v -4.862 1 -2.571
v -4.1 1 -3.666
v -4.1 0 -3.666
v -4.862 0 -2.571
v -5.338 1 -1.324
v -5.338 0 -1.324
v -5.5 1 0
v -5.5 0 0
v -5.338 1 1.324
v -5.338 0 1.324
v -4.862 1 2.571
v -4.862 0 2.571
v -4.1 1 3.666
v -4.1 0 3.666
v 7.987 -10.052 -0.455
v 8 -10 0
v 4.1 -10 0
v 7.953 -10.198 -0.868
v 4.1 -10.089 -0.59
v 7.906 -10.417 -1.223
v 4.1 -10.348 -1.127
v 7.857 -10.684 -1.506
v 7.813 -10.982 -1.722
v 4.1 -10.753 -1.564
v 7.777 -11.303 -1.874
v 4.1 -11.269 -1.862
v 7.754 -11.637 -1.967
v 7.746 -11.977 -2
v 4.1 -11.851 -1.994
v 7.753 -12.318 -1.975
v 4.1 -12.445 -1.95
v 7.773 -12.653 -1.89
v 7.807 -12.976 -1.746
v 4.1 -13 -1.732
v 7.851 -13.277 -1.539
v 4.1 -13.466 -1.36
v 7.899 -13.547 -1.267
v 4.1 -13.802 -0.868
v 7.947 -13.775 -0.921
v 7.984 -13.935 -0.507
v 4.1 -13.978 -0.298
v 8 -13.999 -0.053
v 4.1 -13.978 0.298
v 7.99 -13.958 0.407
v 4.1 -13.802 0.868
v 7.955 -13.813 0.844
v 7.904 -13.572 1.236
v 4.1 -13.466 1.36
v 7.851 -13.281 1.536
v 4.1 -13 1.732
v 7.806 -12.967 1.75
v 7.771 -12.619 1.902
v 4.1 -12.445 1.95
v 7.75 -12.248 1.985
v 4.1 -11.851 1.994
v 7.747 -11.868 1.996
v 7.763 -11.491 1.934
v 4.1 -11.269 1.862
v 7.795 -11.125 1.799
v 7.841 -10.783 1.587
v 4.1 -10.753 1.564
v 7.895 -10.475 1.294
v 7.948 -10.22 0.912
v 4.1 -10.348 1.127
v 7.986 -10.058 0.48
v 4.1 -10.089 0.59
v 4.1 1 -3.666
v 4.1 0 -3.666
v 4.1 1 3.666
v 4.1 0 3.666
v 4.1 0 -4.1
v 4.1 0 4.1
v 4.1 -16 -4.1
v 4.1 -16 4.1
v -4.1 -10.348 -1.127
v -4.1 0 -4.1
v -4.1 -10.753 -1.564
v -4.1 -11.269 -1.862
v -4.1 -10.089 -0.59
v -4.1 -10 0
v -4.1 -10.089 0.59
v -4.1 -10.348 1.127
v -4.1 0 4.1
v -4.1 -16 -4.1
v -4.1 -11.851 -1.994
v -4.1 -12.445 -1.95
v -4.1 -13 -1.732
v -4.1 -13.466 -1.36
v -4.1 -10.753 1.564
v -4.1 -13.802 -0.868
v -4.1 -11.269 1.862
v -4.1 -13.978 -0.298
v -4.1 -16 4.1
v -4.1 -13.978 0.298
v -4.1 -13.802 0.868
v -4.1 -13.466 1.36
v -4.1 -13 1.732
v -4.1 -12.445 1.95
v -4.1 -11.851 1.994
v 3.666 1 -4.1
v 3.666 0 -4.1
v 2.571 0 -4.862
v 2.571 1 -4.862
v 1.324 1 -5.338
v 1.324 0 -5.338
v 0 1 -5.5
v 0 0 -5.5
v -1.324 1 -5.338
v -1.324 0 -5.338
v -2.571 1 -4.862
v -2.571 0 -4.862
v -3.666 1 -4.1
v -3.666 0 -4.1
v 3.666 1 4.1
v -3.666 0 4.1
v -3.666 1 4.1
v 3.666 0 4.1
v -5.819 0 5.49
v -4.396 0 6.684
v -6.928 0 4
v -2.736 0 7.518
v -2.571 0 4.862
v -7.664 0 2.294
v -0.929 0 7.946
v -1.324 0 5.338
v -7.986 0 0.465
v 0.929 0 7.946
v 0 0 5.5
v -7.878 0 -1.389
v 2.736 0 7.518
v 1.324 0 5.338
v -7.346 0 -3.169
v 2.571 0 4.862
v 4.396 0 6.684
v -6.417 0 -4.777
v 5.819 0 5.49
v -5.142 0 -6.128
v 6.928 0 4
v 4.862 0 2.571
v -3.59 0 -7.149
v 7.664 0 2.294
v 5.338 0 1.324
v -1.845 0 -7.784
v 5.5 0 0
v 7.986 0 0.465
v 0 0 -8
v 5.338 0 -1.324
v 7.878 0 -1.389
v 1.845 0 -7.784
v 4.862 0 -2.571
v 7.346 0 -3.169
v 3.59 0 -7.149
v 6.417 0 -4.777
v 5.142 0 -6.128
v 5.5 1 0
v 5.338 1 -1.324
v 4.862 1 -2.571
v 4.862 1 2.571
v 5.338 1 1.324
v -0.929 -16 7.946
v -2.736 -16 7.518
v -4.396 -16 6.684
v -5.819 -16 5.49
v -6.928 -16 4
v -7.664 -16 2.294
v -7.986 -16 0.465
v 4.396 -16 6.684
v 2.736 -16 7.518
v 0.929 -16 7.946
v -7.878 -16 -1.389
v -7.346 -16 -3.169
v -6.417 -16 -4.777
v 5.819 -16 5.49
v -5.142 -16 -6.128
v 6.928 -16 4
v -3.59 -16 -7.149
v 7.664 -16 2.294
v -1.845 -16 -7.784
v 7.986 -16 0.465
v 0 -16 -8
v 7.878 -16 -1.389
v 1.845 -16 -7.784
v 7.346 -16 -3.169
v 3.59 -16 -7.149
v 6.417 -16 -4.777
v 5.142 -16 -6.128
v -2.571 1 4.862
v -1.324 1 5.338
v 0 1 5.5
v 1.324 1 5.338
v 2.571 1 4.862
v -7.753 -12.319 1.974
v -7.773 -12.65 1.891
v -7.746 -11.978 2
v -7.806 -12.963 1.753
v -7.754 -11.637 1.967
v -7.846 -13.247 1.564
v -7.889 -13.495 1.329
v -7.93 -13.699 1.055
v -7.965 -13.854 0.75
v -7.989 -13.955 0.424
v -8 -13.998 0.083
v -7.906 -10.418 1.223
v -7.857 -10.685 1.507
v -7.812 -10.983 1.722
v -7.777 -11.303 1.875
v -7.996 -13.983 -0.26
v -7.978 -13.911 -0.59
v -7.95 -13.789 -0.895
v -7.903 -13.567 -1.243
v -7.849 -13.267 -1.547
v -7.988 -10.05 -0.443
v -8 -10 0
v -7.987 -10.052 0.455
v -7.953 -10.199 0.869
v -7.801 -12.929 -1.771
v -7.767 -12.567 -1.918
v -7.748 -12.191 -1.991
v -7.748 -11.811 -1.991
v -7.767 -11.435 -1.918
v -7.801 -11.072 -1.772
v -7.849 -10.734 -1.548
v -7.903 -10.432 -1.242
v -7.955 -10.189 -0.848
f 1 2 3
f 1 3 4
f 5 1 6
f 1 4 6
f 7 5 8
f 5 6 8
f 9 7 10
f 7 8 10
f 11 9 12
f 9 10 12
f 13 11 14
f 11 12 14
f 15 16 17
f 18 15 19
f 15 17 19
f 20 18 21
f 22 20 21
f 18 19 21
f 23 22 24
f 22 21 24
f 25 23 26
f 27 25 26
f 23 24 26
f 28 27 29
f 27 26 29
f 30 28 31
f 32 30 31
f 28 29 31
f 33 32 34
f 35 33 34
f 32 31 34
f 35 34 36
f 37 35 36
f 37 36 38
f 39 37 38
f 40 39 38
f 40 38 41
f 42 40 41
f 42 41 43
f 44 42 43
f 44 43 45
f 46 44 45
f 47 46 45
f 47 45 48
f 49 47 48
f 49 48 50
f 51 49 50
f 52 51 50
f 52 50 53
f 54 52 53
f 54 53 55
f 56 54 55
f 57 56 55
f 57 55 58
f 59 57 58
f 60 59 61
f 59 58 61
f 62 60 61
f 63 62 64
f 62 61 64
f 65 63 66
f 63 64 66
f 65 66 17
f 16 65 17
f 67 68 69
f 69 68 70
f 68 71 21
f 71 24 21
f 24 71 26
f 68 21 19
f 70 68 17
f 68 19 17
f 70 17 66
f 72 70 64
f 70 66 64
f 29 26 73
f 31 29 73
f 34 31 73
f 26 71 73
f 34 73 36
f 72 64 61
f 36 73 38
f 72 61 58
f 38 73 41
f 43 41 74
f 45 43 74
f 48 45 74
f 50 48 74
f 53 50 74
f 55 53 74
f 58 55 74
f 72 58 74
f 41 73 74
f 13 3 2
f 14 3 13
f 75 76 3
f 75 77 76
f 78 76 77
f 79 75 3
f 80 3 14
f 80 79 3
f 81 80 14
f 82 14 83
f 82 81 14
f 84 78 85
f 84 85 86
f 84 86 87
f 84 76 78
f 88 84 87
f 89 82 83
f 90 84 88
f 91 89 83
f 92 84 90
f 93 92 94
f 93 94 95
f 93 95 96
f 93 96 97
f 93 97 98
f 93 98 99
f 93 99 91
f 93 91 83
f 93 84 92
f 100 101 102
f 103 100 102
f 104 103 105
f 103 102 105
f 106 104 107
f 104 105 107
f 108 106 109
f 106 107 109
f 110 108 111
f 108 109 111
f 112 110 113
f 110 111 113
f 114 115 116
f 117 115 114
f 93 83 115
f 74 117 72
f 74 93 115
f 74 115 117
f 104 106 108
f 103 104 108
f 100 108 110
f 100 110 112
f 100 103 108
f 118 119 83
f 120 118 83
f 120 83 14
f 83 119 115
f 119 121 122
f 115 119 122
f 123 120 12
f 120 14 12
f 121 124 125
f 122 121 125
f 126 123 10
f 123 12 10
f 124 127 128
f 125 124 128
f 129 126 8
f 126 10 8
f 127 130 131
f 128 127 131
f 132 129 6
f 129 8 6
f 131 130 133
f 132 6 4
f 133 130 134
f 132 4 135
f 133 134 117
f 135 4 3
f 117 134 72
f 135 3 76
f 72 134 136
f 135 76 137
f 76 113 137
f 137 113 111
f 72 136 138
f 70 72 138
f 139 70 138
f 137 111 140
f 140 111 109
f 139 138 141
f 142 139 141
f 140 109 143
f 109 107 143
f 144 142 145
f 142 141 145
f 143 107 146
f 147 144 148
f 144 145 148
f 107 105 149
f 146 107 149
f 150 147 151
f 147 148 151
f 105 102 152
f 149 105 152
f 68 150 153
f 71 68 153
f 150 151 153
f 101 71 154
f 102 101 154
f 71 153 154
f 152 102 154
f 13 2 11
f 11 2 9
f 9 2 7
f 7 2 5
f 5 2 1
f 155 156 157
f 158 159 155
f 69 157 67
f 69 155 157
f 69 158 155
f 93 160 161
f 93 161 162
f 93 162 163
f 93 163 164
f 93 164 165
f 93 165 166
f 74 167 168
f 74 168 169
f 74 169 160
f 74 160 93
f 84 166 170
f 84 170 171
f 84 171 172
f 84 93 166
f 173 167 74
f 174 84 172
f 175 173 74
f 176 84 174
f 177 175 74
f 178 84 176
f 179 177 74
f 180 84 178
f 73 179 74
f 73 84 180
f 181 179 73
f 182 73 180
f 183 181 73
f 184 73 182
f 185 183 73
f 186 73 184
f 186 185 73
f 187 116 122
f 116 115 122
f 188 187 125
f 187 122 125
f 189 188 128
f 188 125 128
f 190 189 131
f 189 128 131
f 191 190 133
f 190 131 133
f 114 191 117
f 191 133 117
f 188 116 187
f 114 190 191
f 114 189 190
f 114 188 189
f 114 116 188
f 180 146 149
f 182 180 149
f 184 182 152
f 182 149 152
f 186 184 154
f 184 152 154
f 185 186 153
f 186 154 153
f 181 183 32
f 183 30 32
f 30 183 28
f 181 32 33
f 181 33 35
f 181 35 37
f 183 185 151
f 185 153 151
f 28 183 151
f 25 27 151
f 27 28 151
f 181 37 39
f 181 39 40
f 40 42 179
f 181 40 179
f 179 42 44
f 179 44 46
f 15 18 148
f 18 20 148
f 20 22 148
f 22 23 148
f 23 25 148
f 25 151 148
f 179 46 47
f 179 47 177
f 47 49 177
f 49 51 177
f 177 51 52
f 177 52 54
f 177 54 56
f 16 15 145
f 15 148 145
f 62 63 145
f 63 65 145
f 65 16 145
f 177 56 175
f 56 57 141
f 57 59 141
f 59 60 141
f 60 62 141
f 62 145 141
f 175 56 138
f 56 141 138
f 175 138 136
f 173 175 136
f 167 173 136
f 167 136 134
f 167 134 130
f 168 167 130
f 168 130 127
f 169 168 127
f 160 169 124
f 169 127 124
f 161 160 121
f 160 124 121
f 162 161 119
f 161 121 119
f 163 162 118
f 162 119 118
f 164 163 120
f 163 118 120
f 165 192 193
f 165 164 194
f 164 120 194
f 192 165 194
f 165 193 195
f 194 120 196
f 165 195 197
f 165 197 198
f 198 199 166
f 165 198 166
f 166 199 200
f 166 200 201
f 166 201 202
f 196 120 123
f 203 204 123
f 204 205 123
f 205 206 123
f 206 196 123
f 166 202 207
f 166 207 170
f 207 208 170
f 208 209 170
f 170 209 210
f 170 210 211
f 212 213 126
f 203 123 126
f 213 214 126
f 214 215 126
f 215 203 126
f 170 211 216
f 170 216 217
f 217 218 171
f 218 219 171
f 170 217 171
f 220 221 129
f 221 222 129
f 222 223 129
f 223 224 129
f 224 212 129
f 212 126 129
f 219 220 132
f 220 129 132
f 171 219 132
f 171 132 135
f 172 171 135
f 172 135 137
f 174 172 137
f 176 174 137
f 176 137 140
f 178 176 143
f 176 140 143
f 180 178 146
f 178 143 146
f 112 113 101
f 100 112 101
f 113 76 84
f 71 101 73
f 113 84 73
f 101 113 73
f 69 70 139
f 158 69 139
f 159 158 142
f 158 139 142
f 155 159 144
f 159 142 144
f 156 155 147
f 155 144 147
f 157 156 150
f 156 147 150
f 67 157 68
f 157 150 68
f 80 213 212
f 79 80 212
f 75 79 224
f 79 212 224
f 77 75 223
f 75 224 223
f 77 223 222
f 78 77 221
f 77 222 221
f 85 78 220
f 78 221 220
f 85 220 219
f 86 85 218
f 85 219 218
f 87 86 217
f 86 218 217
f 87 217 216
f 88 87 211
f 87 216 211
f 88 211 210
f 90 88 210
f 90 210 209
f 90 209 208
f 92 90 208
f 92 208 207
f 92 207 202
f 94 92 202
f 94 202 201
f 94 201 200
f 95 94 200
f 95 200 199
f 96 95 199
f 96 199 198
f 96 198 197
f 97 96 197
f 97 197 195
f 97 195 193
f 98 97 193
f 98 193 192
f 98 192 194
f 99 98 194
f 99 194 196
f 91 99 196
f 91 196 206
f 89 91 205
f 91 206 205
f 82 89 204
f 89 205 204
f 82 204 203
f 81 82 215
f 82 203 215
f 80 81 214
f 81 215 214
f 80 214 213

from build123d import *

# Parameters (mm, degrees)
SKETCH1_R           = 5.5
BOSS_EXTRUDE1_DEPTH = 1
SKETCH2_R           = 8
BOSS_EXTRUDE2_DEPTH = 16
SKETCH3_W           = 8.2
SKETCH3_H           = 8.2
CUT_EXTRUDE1_DEPTH  = 21.420577857
SKETCH4_R           = 2
CUT_EXTRUDE2_DEPTH  = 25


with BuildPart() as part:
    # Sketch1 → Boss-Extrude1 (new body)
    with BuildSketch(Plane(origin=(0, 0, 0), x_dir=(1, 0, 0), z_dir=(0, 1, 0))):
        with Locations(Location((0, 0, 0), (0, 0, 270))):
            Circle(SKETCH1_R)
    extrude(amount=BOSS_EXTRUDE1_DEPTH)

    # Sketch2 → Boss-Extrude2 (add)
    with BuildSketch(Plane(origin=(0, 0, 0), x_dir=(-1, 0, 0), z_dir=(0, -1, 0))):
        with Locations(Location((0, 0, 0), (0, 0, 90))):
            Circle(SKETCH2_R)
    extrude(amount=BOSS_EXTRUDE2_DEPTH)

    # Sketch3 → Cut-Extrude1 (cut, through all)
    with BuildSketch(Plane.XZ.offset(16)):
        Rectangle(SKETCH3_W, SKETCH3_H)
    extrude(amount=-CUT_EXTRUDE1_DEPTH, mode=Mode.SUBTRACT)

    # Sketch4 → Cut-Extrude2 (cut, through all)
    with BuildSketch(Plane.ZY.offset(8)):
        with Locations(Location((0, -12, 0), (0, 0, 90))):
            Circle(SKETCH4_R)
    extrude(amount=-CUT_EXTRUDE2_DEPTH, mode=Mode.SUBTRACT)


solid = part.part
